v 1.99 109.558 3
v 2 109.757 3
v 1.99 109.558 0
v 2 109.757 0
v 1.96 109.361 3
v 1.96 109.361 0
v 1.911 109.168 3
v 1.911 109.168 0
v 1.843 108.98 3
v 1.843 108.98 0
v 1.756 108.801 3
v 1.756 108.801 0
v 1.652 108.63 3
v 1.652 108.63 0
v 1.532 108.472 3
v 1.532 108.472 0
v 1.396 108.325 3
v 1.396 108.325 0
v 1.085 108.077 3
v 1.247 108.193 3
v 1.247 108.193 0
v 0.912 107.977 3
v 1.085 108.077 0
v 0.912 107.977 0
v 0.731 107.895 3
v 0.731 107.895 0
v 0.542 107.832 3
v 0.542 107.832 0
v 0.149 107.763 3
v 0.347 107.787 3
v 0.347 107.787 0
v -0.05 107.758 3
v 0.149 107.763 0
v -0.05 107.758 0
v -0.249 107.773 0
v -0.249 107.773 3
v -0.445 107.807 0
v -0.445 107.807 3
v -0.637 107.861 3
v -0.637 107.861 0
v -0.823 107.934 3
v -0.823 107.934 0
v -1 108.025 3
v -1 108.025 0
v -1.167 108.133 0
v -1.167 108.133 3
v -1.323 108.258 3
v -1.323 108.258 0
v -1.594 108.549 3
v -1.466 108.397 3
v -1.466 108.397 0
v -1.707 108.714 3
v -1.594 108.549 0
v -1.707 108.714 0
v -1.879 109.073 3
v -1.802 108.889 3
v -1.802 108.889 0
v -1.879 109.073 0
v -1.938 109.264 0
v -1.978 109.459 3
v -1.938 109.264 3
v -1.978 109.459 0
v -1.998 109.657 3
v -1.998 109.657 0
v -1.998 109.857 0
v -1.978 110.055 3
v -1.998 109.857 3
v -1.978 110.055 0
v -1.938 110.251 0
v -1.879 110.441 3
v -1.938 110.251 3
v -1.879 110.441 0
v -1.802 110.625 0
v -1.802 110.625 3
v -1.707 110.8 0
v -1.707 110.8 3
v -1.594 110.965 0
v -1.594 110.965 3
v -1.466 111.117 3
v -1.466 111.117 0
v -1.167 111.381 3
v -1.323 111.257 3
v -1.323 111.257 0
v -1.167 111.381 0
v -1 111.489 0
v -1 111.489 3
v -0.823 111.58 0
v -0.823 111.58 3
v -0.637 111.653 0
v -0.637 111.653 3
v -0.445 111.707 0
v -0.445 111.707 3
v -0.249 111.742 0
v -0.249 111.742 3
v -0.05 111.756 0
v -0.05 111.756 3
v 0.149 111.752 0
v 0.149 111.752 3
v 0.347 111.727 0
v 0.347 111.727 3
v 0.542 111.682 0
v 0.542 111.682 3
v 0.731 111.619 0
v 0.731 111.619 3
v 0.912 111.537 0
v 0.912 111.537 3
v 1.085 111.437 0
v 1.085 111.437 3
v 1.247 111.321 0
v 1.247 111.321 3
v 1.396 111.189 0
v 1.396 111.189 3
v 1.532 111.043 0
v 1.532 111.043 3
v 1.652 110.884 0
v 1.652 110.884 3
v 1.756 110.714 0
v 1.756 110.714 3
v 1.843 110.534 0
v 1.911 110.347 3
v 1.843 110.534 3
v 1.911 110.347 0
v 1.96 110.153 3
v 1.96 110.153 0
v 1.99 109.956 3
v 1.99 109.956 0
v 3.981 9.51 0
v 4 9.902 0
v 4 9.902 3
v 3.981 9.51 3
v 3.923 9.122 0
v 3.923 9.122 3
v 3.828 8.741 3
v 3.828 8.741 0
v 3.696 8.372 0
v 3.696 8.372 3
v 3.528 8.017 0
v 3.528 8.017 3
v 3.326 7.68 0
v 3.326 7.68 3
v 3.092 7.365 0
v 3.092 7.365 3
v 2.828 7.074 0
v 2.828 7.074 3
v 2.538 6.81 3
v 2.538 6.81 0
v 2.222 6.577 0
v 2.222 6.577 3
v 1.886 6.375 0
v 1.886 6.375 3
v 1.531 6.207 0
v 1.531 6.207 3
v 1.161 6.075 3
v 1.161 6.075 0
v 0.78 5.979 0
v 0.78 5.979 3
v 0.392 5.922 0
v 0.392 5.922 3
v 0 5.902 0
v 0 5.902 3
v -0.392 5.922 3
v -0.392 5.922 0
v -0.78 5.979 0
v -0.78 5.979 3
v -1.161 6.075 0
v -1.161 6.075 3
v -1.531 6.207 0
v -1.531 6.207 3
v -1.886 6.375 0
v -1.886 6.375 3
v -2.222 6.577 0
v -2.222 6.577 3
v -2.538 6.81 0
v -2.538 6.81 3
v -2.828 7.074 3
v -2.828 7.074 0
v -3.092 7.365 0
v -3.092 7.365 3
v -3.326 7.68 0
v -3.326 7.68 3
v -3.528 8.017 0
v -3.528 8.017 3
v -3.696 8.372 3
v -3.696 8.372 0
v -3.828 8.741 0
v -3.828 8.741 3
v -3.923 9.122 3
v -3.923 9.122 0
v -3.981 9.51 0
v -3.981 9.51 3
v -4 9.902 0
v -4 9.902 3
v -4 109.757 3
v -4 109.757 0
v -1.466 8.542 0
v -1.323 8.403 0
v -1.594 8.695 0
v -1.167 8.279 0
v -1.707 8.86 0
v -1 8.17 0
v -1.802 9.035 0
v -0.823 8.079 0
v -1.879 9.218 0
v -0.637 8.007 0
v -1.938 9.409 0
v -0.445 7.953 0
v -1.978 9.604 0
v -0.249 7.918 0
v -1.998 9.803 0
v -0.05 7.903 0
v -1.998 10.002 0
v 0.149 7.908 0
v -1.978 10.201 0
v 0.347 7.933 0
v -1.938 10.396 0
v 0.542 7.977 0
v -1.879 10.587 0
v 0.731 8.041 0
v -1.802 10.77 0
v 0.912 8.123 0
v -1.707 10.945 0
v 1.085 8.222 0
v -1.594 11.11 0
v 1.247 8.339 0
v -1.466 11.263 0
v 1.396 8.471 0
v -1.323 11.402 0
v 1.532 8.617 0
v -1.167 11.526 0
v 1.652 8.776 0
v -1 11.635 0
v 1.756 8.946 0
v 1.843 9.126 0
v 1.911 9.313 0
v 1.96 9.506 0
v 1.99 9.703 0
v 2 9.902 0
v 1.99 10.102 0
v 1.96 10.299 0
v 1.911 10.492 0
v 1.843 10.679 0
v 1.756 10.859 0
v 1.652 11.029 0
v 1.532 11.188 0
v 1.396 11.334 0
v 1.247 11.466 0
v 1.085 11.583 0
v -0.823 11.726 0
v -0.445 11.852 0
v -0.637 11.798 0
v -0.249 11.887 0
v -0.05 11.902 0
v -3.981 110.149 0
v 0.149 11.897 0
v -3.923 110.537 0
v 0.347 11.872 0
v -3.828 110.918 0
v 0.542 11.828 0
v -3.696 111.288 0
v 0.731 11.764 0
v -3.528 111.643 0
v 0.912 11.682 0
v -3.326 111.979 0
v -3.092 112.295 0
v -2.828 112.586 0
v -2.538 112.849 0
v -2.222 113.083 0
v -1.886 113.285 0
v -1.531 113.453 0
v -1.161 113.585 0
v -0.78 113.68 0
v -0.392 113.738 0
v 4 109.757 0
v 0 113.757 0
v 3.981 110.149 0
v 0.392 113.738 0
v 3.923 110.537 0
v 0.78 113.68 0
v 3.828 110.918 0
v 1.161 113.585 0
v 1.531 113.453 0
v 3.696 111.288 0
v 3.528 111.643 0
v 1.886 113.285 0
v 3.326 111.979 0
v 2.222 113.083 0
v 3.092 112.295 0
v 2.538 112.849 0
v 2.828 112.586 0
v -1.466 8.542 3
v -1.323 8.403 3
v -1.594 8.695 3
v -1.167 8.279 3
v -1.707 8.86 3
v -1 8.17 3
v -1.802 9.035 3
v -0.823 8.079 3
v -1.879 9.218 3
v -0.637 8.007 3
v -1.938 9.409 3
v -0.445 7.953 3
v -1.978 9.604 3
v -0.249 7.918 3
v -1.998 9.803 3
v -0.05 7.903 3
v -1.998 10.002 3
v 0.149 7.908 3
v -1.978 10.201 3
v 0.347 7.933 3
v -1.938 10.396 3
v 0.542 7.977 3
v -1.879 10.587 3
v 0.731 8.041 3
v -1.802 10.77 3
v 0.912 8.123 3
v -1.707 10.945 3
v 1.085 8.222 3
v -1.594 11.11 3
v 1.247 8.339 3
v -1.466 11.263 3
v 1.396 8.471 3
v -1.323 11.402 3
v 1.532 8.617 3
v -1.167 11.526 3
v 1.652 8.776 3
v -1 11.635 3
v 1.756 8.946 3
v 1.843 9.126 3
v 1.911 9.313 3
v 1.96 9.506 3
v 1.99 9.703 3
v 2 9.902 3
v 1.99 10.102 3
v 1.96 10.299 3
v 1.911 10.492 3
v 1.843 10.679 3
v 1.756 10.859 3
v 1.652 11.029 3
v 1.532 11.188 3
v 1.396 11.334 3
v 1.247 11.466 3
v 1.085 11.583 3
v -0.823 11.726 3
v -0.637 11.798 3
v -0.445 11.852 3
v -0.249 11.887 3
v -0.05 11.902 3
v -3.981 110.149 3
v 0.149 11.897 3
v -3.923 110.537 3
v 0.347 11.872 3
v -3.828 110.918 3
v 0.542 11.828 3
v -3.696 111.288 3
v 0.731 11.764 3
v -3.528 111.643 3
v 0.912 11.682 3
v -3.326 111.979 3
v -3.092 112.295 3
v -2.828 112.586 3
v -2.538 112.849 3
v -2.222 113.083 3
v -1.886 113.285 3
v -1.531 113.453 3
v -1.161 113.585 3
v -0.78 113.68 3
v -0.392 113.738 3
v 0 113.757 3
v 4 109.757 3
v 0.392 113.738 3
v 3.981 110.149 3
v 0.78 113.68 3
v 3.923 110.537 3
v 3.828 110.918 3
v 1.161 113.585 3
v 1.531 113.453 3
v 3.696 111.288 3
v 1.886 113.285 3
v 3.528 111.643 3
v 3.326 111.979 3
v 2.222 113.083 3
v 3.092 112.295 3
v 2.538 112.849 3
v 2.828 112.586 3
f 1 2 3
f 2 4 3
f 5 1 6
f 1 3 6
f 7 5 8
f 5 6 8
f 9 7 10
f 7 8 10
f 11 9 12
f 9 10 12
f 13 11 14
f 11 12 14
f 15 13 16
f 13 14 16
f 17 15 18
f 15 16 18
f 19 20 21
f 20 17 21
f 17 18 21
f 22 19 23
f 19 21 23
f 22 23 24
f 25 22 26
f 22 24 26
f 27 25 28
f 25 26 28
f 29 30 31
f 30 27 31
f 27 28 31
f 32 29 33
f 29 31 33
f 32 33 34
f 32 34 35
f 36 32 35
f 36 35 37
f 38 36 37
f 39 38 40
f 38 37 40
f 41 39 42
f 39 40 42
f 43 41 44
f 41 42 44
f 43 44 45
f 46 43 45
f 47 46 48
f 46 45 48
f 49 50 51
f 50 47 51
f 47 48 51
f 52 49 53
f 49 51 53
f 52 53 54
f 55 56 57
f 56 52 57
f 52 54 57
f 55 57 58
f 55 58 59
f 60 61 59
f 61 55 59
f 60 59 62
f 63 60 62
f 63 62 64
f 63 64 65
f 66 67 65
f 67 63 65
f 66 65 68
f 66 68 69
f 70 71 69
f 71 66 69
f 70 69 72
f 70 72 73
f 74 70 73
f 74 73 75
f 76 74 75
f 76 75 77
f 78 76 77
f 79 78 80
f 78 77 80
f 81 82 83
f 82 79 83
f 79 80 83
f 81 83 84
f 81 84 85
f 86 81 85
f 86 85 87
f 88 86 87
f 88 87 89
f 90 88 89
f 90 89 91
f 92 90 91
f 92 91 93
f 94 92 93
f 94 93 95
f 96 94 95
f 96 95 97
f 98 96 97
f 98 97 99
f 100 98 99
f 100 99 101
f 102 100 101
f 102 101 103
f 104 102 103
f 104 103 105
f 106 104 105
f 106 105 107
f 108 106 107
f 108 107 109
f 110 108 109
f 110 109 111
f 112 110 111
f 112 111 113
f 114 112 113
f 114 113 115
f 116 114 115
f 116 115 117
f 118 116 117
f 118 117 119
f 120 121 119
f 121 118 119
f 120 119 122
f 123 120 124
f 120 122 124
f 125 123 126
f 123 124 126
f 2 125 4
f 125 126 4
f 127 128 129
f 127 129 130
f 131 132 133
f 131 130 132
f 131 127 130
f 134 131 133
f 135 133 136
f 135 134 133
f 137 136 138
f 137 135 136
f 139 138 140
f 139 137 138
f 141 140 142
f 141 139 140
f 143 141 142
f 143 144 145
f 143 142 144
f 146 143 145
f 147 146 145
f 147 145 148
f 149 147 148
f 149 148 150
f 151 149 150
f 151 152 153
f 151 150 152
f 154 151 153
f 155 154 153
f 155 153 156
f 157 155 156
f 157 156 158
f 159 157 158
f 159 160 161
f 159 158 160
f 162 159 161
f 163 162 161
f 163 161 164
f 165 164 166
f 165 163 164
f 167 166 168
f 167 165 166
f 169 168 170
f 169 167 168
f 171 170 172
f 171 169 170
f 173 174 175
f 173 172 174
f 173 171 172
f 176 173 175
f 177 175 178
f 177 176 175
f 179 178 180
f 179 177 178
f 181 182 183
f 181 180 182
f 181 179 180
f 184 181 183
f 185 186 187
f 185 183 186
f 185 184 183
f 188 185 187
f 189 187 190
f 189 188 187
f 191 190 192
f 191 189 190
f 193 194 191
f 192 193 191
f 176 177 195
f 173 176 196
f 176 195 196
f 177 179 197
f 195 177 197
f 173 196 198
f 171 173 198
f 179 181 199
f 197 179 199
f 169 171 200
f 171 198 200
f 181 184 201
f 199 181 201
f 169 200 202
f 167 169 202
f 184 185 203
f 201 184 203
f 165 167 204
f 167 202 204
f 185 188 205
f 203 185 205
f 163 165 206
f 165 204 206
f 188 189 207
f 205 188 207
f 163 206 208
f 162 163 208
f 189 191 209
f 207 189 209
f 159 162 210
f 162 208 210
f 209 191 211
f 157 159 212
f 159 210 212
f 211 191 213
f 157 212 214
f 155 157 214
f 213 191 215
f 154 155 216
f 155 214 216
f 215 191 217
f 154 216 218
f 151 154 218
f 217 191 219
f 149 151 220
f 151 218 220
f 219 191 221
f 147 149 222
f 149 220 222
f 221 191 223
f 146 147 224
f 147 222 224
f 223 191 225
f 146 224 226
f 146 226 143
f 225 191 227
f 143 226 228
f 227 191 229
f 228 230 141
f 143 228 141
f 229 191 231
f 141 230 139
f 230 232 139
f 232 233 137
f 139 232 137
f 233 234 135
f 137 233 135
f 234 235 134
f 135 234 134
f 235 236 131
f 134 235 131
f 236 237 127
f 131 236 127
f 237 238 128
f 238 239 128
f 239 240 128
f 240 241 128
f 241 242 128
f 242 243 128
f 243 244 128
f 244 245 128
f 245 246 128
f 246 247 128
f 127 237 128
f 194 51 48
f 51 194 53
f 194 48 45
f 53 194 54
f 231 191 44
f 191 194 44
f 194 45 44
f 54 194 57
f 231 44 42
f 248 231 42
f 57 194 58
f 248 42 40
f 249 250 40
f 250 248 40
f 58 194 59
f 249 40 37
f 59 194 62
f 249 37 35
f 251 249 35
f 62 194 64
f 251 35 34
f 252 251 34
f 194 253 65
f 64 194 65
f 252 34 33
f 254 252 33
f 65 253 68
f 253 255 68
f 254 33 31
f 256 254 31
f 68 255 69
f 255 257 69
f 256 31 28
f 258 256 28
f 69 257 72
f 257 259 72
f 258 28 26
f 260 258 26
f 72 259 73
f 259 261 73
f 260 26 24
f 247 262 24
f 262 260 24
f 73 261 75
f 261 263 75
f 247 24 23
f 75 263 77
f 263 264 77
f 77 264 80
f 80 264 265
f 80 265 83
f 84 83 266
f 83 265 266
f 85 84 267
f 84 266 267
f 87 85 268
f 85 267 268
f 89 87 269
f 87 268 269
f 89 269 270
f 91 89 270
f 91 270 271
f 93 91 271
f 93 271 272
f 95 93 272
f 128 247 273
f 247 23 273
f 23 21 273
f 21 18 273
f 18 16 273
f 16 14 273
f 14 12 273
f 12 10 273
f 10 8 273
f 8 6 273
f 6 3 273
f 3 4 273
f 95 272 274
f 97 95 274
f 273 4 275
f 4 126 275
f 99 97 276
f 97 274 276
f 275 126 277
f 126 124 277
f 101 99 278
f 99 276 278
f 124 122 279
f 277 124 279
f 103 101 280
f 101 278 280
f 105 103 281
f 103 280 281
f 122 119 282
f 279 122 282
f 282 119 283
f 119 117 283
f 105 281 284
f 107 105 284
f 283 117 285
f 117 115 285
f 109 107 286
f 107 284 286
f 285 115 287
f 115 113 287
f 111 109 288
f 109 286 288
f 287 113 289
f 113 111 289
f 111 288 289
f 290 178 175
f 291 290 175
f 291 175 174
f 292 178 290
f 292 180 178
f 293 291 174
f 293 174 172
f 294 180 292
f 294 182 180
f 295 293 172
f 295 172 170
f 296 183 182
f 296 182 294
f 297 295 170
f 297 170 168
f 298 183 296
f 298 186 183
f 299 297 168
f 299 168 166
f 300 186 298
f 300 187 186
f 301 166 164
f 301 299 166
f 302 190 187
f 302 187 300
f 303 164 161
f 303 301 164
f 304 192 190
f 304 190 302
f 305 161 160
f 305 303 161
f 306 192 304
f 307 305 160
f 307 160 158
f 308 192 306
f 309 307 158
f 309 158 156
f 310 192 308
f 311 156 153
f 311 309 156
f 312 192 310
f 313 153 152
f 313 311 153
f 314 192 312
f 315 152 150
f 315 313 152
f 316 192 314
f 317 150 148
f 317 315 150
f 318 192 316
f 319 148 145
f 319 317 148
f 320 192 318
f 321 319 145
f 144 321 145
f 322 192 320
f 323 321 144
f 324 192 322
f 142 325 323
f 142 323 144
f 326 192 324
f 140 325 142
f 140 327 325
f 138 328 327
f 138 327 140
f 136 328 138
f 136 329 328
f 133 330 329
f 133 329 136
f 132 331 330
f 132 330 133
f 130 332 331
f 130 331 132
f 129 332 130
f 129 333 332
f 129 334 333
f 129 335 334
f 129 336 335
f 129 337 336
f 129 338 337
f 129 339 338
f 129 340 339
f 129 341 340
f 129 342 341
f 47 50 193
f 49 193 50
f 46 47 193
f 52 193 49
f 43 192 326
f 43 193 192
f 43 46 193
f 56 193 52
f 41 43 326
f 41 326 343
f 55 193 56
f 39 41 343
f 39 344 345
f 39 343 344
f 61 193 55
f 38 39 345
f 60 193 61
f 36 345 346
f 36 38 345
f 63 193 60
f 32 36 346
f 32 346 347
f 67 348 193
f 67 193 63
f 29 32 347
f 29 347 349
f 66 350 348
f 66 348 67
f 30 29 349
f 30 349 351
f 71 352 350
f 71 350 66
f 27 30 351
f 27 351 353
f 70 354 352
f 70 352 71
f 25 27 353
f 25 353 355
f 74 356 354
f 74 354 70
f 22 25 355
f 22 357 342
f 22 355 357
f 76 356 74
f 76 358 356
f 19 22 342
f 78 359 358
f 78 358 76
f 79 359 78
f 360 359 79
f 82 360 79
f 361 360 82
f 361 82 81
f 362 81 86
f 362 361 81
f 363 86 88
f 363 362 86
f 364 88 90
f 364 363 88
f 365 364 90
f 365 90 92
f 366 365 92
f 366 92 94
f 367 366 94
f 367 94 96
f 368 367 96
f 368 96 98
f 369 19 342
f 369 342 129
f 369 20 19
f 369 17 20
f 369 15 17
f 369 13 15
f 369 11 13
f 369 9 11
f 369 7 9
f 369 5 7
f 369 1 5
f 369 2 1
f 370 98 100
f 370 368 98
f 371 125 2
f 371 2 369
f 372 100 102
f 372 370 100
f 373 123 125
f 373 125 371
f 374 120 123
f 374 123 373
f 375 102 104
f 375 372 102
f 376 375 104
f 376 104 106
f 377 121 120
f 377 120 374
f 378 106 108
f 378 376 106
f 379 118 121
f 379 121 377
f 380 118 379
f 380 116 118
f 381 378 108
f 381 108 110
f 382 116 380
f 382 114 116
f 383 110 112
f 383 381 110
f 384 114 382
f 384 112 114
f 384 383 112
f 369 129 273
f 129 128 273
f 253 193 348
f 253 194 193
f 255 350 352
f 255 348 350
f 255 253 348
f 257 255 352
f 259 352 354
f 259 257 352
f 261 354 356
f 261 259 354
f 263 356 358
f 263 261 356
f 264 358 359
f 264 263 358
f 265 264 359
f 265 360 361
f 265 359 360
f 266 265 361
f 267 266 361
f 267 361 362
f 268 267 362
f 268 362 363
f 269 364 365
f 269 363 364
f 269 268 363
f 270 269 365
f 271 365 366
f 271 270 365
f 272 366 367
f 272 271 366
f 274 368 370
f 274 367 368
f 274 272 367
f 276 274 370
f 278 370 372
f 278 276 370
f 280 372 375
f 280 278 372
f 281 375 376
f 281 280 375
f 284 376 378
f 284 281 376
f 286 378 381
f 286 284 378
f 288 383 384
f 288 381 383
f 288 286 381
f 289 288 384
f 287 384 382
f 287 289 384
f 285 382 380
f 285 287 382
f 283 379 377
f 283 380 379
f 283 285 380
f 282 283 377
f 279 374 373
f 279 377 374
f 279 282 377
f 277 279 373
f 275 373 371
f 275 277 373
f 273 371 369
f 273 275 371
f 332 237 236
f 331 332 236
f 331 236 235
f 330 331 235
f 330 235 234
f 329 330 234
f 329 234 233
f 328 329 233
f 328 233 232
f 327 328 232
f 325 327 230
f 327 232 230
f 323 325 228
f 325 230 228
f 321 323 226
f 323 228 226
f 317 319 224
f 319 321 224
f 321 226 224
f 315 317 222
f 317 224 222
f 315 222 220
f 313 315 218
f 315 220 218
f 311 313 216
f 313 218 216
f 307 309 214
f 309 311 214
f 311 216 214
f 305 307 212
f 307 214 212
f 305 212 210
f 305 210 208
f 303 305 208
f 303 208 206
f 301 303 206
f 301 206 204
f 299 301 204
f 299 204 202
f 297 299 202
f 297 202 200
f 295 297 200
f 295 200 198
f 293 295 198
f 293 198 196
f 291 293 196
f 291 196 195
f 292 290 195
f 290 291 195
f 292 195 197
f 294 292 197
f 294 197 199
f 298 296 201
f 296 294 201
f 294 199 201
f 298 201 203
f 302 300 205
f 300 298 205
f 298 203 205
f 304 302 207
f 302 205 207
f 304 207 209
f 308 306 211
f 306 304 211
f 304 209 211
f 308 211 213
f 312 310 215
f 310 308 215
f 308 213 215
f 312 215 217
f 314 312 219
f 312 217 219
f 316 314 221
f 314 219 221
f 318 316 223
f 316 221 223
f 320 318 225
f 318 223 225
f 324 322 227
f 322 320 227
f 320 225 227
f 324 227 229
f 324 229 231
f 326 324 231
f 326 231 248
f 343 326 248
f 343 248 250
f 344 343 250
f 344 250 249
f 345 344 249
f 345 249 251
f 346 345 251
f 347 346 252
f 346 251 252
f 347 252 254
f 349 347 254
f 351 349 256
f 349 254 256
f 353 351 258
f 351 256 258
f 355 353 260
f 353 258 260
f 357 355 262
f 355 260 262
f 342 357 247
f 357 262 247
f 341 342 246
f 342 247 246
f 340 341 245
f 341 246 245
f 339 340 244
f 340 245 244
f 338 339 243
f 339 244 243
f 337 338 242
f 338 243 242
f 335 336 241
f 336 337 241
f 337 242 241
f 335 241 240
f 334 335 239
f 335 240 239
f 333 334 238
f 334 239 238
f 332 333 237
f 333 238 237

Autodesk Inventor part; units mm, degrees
ref_plane "YZ Plane" through (0, 0, 0) normal (1, 0, 0) x (0, 1, 0)
ref_plane "XZ Plane" through (0, 0, 0) normal (0, 1, 0) x (-1, 0, 0)
ref_plane "XY Plane" through (0, 0, 0) normal (0, 0, 1) x (1, 0, 0)
ref_plane "Work Plane1" through (0, 0, 0) normal (0, 0, 1) x (1, 0, 0)
sketch "Sketch1" plane through (0, 0, 0) normal (0, 0, 1) x (1, 0, 0)
  line L0 (-4.7216, 11.5478) -> (-13.9385, -14.9025) projected
  line L1 (-13.9385, -14.9025) -> (13.9385, -14.9025) projected
  line L2 (13.9385, -14.9025) -> (4.7216, 11.5478) projected
  arc A0 (4.7216, 11.5478) -> (-4.7216, 11.5478) centre (0, 9.9025) ccw projected
  circle A1 centre (0, 9.9025) radius 2 projected
  line L3 (2, 139.4798) -> (-2, 139.4798) projected
  line L4 (4.7216, 108.1118) -> (13.9385, 134.5621) projected
  line L5 (13.9385, 134.5621) -> (-13.9385, 134.5621) projected
  line L6 (-13.9385, 134.5621) -> (-4.7216, 108.1118) projected
  arc A2 (-4.7216, 108.1118) -> (4.7216, 108.1118) centre (0, 109.7571) ccw projected
  circle A3 centre (0, 109.7571) radius 2 projected
  line L7 (0, 9.9025) -> (0, 109.7571) construction
  line L8 (4, 9.9025) -> (4, 109.7571)
  line L9 (-4, 109.7571) -> (-4, 9.9025)
  arc A4 (-4, 9.9025) -> (4, 9.9025) centre (0, 9.9025) ccw
  arc A5 (4, 109.7571) -> (-4, 109.7571) centre (0, 109.7571) ccw
  point P0 (0, 0)
  point P1 (0, 59.8298)
  dimension "d0" = 8
extrude "Extrusion1" add sketch "Sketch1" along normal blind 3 contours L9 A2 L8 A0 | A0 L8 A4 L9 | L9 A5 L8 A2
properties part number "horizontal truss top"
